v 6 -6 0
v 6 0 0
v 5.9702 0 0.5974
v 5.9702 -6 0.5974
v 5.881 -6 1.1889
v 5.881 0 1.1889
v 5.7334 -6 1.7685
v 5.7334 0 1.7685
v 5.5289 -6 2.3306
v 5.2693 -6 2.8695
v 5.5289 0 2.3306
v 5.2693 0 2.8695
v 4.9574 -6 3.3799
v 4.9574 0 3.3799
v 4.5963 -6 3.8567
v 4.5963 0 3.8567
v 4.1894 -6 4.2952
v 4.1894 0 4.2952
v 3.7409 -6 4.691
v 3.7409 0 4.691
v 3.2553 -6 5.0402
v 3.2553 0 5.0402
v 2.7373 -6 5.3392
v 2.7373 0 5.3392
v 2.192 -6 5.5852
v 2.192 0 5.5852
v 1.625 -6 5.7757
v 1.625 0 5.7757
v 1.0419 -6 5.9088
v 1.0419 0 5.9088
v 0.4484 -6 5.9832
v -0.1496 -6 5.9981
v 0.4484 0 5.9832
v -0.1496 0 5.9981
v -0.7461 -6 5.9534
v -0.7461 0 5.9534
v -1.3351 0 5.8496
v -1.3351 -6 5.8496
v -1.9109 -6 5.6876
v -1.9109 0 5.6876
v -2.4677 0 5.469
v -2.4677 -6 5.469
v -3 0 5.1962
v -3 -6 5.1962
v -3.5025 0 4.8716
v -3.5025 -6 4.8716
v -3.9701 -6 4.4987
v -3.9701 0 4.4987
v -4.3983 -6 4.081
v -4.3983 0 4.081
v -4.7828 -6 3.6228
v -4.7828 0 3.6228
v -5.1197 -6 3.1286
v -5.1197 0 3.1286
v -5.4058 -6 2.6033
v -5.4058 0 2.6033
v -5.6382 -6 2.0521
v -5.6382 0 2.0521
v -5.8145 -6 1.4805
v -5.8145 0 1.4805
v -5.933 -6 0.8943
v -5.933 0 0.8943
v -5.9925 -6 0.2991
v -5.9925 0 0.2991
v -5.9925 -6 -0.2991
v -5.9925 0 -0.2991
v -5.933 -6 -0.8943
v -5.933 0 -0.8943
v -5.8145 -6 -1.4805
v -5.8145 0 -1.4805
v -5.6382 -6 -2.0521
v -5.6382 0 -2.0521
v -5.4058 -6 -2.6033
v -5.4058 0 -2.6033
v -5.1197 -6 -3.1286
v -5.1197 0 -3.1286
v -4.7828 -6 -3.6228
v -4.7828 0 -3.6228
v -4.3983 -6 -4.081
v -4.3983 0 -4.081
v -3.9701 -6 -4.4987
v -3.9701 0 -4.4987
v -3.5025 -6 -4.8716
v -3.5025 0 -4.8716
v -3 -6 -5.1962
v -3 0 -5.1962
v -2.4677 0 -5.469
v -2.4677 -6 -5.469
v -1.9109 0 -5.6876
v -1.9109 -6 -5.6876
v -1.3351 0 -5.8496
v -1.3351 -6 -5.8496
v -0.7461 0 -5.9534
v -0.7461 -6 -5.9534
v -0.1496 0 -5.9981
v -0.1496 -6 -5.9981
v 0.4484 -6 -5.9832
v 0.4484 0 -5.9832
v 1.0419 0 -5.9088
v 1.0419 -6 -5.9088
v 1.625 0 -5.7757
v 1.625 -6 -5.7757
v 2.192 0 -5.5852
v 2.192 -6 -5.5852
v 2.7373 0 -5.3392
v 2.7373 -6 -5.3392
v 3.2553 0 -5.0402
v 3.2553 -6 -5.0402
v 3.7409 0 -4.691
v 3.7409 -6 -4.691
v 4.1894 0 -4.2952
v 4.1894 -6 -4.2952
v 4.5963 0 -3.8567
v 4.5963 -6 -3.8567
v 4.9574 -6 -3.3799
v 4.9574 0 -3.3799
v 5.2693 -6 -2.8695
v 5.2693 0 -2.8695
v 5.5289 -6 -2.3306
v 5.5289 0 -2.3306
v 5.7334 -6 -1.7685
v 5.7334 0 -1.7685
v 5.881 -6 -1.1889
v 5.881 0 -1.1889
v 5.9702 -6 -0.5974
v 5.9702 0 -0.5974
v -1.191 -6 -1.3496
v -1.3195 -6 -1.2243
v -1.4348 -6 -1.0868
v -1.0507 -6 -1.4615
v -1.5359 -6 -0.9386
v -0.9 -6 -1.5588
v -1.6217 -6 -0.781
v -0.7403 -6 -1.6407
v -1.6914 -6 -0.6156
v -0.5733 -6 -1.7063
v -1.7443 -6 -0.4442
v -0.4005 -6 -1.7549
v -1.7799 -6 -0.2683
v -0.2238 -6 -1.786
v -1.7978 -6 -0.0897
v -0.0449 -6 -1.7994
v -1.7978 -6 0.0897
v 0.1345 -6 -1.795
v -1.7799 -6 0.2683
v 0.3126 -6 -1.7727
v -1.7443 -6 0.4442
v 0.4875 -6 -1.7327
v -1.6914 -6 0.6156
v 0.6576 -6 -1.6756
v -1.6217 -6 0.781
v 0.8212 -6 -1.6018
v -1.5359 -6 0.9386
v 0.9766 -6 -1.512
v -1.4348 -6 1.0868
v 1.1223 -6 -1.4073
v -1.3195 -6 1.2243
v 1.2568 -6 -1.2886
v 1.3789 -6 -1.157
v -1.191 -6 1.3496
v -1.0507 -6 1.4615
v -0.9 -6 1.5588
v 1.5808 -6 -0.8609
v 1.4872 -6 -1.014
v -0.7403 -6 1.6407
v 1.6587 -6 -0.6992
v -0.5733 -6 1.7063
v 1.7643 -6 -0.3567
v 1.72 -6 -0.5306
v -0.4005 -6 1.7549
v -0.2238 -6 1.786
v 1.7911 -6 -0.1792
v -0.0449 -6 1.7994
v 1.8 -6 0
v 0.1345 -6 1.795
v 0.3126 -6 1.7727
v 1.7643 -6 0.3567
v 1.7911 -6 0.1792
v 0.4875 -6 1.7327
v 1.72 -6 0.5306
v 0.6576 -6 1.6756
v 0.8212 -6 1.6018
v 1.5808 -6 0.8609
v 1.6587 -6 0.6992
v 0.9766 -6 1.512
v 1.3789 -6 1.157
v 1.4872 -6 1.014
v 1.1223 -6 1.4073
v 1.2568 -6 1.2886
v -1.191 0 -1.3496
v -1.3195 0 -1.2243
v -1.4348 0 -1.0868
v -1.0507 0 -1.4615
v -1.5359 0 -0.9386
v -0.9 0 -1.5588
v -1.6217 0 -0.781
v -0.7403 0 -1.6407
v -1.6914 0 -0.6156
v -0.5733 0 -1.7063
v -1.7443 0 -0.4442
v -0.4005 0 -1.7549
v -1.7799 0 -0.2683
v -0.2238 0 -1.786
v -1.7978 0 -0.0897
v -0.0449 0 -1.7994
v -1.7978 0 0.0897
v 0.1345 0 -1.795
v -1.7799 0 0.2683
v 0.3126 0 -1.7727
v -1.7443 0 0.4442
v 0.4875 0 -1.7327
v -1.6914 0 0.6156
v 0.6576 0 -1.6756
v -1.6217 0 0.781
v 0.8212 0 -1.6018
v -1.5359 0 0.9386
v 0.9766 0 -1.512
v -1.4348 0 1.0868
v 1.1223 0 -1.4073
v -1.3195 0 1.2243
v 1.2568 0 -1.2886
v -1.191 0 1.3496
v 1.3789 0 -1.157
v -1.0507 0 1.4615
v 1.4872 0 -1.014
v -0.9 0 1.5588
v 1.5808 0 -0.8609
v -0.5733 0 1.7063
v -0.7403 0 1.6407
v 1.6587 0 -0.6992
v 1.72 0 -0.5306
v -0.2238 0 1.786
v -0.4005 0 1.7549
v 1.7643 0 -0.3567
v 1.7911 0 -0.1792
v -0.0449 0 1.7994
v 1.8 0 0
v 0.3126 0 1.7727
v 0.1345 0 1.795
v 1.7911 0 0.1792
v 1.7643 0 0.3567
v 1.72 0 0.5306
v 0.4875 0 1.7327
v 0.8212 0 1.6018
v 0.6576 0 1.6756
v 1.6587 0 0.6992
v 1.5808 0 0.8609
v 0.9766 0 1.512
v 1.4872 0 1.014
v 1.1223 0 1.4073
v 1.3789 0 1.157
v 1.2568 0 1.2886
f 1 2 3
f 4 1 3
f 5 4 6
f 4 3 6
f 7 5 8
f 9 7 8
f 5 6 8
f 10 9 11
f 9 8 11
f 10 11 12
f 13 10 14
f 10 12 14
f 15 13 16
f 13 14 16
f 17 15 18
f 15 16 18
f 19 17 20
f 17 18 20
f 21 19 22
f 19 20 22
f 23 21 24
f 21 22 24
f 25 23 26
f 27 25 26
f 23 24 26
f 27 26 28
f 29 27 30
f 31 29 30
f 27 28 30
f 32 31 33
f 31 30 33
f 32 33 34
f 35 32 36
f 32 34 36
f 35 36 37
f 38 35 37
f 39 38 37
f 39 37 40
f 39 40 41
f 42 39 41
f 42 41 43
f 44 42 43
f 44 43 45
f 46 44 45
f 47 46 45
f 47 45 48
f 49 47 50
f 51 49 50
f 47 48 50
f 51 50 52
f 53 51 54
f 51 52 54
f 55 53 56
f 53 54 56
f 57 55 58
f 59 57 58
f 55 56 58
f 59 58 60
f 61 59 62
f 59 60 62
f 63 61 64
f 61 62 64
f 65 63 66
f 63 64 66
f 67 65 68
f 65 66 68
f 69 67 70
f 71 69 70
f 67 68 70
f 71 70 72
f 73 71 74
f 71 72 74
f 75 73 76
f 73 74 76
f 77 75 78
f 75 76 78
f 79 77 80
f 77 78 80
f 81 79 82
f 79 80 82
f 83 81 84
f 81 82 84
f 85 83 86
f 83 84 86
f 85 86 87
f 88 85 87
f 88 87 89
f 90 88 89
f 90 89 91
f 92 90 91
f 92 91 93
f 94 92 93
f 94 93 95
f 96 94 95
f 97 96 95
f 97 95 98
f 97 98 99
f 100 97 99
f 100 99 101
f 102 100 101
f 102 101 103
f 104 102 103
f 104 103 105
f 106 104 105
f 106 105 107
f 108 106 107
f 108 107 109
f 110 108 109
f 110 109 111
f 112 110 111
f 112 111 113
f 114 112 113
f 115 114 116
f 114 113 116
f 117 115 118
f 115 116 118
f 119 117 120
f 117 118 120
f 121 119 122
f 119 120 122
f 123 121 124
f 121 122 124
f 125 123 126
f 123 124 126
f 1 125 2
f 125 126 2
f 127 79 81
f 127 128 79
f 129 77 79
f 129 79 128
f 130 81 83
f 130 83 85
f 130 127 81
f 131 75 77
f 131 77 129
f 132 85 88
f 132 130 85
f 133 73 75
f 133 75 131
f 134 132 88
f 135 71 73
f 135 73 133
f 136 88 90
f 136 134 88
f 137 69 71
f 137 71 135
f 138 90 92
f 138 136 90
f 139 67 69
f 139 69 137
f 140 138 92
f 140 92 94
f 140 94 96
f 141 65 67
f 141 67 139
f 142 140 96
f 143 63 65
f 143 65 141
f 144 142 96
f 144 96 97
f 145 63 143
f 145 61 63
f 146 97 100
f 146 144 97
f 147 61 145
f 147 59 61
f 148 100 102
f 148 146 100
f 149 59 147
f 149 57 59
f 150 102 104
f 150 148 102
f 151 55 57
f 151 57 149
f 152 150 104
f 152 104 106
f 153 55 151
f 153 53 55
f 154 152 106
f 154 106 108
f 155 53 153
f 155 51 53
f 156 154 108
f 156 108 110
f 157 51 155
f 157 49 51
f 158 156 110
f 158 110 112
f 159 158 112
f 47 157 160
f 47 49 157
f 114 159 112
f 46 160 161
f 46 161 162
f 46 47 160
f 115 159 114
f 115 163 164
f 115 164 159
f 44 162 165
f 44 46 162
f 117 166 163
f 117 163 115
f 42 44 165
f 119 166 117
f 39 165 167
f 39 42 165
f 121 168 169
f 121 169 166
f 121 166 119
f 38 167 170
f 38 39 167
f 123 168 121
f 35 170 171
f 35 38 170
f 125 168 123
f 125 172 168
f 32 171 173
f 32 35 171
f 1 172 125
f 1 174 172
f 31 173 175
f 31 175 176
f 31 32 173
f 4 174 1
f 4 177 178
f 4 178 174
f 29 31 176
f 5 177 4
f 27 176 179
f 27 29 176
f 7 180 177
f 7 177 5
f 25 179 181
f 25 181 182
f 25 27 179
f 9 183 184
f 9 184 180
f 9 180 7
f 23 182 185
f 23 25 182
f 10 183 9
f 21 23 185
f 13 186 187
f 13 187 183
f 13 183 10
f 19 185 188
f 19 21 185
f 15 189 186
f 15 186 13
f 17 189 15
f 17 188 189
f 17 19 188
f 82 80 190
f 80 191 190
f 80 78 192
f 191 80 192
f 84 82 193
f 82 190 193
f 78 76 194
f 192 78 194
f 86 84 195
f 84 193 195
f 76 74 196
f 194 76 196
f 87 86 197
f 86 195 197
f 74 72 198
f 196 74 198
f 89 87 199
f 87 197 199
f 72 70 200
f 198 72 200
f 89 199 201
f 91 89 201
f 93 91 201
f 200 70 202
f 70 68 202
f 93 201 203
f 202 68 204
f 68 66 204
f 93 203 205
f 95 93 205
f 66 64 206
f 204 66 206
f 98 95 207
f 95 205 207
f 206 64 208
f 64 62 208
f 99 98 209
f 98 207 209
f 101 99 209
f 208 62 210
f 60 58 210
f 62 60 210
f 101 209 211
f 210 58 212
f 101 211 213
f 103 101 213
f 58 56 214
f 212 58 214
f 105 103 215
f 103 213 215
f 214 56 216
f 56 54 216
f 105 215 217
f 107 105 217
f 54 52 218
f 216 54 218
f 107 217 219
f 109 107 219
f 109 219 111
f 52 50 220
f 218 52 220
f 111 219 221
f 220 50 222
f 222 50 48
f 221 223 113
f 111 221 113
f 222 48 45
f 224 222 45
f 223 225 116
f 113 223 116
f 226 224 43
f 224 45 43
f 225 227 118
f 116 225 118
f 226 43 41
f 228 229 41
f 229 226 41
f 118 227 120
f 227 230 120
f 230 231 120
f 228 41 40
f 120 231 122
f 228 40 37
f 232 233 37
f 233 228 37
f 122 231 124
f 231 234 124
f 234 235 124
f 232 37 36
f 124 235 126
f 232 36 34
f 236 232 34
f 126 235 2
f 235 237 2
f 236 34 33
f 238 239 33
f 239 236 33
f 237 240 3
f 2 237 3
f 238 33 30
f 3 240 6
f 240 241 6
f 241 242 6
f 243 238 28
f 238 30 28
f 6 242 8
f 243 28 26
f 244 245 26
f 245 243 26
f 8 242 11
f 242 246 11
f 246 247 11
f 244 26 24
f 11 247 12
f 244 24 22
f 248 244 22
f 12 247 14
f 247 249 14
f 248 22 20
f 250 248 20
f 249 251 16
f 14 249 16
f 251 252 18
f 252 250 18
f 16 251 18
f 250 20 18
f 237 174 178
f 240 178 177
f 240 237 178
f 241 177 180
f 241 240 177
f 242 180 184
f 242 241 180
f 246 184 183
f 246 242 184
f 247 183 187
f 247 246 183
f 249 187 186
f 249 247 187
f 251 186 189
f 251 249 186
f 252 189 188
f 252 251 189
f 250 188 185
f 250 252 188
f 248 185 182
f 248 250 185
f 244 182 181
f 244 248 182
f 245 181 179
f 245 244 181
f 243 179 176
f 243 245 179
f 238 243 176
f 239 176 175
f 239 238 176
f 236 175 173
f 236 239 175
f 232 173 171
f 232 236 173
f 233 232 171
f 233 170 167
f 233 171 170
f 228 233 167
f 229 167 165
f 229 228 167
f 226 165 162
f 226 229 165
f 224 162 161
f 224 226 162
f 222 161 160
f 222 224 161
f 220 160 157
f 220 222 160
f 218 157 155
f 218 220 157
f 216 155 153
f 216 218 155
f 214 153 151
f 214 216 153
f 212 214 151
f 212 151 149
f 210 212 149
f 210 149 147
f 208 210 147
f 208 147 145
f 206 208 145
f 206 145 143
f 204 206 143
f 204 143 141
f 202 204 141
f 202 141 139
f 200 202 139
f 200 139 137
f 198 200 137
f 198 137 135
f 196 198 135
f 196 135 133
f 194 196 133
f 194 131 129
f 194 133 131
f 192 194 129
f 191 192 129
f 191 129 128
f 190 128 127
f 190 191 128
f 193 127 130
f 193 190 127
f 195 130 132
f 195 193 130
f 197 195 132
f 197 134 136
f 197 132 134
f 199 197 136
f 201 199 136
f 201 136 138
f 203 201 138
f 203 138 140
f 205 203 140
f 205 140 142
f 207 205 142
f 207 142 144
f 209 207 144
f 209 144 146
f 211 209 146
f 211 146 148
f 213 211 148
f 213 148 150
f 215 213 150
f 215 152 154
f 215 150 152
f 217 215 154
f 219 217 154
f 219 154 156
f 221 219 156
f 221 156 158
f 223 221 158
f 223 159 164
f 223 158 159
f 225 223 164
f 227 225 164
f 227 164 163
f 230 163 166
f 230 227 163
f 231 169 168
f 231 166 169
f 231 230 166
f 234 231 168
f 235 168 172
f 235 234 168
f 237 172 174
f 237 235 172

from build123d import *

# Parameters (mm, degrees)
CYLINDER011030_R     = 1.8
CYLINDER011030_DEPTH = 20
CYLINDER011031_R     = 6
CYLINDER011031_DEPTH = 6


with BuildPart() as belt_attach_bolt_hole:
    # Cylinder011030 → Cylinder011030 (new body)
    with BuildSketch(Plane.XZ):
        Circle(CYLINDER011030_R)
    extrude(amount=CYLINDER011030_DEPTH)


with BuildPart() as belt_horizontal_attach_washer_cut:
    # Cylinder011031 → Cylinder011031 (new body)
    with BuildSketch(Plane.XZ):
        Circle(CYLINDER011031_R)
    extrude(amount=CYLINDER011031_DEPTH)

    # Cut023015009021: cut belt attach bolt hole
    add(belt_attach_bolt_hole.part, mode=Mode.SUBTRACT)


solid = belt_horizontal_attach_washer_cut.part
